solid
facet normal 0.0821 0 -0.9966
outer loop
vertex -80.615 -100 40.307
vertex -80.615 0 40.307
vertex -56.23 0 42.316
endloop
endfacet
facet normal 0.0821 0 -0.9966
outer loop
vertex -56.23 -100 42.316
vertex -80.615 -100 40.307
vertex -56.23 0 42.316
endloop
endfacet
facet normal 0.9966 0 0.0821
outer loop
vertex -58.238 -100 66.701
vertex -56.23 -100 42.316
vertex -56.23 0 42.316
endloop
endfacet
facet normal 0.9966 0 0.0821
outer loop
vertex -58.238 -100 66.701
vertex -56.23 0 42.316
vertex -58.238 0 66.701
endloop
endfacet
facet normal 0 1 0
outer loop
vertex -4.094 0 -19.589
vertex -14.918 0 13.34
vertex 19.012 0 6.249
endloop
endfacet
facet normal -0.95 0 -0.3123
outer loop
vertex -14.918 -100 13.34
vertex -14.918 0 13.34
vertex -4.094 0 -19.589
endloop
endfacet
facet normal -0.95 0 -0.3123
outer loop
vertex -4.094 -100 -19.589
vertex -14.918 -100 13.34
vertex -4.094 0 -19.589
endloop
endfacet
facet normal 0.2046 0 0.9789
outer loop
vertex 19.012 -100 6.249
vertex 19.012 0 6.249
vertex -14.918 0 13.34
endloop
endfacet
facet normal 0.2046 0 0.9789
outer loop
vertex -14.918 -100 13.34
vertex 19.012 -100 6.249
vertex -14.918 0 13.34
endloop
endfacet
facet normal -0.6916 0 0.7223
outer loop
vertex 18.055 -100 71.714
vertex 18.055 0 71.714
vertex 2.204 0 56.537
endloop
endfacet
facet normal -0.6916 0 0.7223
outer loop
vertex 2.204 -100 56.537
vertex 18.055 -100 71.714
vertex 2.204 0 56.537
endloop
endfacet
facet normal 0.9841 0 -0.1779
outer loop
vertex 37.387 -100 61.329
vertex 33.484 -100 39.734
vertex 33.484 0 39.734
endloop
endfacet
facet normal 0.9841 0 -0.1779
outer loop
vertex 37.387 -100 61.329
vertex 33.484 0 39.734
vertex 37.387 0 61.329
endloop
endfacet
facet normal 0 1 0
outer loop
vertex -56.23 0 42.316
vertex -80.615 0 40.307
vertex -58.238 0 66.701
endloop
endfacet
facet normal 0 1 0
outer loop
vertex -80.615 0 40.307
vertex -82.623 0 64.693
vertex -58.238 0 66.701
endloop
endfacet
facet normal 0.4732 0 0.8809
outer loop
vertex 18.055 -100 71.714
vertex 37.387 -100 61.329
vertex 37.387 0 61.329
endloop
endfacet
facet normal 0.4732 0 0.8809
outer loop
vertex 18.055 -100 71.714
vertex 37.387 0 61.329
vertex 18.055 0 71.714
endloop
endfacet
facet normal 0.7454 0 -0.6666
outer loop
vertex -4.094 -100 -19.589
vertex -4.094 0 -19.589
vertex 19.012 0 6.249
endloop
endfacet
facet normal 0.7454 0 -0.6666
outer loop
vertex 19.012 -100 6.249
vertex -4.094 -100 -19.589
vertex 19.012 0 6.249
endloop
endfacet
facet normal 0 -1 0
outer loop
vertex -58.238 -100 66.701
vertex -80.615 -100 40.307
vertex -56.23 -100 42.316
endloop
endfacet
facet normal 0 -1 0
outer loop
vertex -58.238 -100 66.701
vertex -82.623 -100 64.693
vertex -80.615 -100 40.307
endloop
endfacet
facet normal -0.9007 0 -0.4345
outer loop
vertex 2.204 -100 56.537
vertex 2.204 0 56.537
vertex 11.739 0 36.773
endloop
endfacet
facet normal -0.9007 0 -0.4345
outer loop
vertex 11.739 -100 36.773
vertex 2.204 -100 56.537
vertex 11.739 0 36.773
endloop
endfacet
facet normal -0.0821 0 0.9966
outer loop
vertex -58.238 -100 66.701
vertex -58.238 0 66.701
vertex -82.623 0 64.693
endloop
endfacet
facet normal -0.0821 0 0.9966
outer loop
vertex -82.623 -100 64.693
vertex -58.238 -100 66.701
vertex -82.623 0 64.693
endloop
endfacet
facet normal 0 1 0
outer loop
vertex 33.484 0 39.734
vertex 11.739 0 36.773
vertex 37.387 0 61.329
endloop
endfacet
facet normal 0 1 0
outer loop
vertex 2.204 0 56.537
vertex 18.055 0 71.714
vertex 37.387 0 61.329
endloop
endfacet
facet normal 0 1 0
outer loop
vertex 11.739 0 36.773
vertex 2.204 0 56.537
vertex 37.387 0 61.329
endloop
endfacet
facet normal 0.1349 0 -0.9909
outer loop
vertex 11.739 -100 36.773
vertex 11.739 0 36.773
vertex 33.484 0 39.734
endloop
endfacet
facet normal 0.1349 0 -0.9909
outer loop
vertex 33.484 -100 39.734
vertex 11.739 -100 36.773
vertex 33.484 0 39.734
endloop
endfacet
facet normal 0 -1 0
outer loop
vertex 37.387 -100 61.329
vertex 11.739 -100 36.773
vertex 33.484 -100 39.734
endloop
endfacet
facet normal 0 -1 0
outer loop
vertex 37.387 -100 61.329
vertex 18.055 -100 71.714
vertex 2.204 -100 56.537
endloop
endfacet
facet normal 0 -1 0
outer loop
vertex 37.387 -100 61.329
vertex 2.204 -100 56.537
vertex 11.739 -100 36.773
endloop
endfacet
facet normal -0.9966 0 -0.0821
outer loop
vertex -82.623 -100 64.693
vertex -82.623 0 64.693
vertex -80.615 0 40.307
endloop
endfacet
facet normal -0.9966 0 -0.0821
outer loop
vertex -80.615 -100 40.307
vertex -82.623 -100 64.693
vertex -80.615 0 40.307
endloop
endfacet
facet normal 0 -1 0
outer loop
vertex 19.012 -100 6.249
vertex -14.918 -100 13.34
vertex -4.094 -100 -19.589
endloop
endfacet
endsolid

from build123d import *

# Parameters (mm, degrees)
F1_DEPTH = 100
F3_DEPTH = 100
F5_DEPTH = 100


with BuildPart() as f1:
    # F0 (on Front) → F1 (new body)
    with BuildSketch(Plane.XZ):
        Polygon((19.011938, 6.249314), (-14.918034, 13.340164), (-4.093904, -19.589478), align=None)
    extrude(amount=F1_DEPTH)


with BuildPart() as f3:
    # F2 (on Front) → F3 (new body)
    with BuildSketch(Plane.XZ):
        Polygon((-80.614757, 40.30738), (-56.229509, 42.315576), (-58.237705, 66.700824), (-82.622953, 64.692628), align=None)
    extrude(amount=F3_DEPTH)


with BuildPart() as f5:
    # F4 (on Front) → F5 (new body)
    with BuildSketch(Plane.XZ):
        Polygon((11.739455, 36.772566), (33.48361, 39.733607), (37.386805, 61.328539), (18.054959, 71.7139), (2.204024, 56.537474), align=None)
    extrude(amount=F5_DEPTH)


solid = Compound([f1.part, f3.part, f5.part])
